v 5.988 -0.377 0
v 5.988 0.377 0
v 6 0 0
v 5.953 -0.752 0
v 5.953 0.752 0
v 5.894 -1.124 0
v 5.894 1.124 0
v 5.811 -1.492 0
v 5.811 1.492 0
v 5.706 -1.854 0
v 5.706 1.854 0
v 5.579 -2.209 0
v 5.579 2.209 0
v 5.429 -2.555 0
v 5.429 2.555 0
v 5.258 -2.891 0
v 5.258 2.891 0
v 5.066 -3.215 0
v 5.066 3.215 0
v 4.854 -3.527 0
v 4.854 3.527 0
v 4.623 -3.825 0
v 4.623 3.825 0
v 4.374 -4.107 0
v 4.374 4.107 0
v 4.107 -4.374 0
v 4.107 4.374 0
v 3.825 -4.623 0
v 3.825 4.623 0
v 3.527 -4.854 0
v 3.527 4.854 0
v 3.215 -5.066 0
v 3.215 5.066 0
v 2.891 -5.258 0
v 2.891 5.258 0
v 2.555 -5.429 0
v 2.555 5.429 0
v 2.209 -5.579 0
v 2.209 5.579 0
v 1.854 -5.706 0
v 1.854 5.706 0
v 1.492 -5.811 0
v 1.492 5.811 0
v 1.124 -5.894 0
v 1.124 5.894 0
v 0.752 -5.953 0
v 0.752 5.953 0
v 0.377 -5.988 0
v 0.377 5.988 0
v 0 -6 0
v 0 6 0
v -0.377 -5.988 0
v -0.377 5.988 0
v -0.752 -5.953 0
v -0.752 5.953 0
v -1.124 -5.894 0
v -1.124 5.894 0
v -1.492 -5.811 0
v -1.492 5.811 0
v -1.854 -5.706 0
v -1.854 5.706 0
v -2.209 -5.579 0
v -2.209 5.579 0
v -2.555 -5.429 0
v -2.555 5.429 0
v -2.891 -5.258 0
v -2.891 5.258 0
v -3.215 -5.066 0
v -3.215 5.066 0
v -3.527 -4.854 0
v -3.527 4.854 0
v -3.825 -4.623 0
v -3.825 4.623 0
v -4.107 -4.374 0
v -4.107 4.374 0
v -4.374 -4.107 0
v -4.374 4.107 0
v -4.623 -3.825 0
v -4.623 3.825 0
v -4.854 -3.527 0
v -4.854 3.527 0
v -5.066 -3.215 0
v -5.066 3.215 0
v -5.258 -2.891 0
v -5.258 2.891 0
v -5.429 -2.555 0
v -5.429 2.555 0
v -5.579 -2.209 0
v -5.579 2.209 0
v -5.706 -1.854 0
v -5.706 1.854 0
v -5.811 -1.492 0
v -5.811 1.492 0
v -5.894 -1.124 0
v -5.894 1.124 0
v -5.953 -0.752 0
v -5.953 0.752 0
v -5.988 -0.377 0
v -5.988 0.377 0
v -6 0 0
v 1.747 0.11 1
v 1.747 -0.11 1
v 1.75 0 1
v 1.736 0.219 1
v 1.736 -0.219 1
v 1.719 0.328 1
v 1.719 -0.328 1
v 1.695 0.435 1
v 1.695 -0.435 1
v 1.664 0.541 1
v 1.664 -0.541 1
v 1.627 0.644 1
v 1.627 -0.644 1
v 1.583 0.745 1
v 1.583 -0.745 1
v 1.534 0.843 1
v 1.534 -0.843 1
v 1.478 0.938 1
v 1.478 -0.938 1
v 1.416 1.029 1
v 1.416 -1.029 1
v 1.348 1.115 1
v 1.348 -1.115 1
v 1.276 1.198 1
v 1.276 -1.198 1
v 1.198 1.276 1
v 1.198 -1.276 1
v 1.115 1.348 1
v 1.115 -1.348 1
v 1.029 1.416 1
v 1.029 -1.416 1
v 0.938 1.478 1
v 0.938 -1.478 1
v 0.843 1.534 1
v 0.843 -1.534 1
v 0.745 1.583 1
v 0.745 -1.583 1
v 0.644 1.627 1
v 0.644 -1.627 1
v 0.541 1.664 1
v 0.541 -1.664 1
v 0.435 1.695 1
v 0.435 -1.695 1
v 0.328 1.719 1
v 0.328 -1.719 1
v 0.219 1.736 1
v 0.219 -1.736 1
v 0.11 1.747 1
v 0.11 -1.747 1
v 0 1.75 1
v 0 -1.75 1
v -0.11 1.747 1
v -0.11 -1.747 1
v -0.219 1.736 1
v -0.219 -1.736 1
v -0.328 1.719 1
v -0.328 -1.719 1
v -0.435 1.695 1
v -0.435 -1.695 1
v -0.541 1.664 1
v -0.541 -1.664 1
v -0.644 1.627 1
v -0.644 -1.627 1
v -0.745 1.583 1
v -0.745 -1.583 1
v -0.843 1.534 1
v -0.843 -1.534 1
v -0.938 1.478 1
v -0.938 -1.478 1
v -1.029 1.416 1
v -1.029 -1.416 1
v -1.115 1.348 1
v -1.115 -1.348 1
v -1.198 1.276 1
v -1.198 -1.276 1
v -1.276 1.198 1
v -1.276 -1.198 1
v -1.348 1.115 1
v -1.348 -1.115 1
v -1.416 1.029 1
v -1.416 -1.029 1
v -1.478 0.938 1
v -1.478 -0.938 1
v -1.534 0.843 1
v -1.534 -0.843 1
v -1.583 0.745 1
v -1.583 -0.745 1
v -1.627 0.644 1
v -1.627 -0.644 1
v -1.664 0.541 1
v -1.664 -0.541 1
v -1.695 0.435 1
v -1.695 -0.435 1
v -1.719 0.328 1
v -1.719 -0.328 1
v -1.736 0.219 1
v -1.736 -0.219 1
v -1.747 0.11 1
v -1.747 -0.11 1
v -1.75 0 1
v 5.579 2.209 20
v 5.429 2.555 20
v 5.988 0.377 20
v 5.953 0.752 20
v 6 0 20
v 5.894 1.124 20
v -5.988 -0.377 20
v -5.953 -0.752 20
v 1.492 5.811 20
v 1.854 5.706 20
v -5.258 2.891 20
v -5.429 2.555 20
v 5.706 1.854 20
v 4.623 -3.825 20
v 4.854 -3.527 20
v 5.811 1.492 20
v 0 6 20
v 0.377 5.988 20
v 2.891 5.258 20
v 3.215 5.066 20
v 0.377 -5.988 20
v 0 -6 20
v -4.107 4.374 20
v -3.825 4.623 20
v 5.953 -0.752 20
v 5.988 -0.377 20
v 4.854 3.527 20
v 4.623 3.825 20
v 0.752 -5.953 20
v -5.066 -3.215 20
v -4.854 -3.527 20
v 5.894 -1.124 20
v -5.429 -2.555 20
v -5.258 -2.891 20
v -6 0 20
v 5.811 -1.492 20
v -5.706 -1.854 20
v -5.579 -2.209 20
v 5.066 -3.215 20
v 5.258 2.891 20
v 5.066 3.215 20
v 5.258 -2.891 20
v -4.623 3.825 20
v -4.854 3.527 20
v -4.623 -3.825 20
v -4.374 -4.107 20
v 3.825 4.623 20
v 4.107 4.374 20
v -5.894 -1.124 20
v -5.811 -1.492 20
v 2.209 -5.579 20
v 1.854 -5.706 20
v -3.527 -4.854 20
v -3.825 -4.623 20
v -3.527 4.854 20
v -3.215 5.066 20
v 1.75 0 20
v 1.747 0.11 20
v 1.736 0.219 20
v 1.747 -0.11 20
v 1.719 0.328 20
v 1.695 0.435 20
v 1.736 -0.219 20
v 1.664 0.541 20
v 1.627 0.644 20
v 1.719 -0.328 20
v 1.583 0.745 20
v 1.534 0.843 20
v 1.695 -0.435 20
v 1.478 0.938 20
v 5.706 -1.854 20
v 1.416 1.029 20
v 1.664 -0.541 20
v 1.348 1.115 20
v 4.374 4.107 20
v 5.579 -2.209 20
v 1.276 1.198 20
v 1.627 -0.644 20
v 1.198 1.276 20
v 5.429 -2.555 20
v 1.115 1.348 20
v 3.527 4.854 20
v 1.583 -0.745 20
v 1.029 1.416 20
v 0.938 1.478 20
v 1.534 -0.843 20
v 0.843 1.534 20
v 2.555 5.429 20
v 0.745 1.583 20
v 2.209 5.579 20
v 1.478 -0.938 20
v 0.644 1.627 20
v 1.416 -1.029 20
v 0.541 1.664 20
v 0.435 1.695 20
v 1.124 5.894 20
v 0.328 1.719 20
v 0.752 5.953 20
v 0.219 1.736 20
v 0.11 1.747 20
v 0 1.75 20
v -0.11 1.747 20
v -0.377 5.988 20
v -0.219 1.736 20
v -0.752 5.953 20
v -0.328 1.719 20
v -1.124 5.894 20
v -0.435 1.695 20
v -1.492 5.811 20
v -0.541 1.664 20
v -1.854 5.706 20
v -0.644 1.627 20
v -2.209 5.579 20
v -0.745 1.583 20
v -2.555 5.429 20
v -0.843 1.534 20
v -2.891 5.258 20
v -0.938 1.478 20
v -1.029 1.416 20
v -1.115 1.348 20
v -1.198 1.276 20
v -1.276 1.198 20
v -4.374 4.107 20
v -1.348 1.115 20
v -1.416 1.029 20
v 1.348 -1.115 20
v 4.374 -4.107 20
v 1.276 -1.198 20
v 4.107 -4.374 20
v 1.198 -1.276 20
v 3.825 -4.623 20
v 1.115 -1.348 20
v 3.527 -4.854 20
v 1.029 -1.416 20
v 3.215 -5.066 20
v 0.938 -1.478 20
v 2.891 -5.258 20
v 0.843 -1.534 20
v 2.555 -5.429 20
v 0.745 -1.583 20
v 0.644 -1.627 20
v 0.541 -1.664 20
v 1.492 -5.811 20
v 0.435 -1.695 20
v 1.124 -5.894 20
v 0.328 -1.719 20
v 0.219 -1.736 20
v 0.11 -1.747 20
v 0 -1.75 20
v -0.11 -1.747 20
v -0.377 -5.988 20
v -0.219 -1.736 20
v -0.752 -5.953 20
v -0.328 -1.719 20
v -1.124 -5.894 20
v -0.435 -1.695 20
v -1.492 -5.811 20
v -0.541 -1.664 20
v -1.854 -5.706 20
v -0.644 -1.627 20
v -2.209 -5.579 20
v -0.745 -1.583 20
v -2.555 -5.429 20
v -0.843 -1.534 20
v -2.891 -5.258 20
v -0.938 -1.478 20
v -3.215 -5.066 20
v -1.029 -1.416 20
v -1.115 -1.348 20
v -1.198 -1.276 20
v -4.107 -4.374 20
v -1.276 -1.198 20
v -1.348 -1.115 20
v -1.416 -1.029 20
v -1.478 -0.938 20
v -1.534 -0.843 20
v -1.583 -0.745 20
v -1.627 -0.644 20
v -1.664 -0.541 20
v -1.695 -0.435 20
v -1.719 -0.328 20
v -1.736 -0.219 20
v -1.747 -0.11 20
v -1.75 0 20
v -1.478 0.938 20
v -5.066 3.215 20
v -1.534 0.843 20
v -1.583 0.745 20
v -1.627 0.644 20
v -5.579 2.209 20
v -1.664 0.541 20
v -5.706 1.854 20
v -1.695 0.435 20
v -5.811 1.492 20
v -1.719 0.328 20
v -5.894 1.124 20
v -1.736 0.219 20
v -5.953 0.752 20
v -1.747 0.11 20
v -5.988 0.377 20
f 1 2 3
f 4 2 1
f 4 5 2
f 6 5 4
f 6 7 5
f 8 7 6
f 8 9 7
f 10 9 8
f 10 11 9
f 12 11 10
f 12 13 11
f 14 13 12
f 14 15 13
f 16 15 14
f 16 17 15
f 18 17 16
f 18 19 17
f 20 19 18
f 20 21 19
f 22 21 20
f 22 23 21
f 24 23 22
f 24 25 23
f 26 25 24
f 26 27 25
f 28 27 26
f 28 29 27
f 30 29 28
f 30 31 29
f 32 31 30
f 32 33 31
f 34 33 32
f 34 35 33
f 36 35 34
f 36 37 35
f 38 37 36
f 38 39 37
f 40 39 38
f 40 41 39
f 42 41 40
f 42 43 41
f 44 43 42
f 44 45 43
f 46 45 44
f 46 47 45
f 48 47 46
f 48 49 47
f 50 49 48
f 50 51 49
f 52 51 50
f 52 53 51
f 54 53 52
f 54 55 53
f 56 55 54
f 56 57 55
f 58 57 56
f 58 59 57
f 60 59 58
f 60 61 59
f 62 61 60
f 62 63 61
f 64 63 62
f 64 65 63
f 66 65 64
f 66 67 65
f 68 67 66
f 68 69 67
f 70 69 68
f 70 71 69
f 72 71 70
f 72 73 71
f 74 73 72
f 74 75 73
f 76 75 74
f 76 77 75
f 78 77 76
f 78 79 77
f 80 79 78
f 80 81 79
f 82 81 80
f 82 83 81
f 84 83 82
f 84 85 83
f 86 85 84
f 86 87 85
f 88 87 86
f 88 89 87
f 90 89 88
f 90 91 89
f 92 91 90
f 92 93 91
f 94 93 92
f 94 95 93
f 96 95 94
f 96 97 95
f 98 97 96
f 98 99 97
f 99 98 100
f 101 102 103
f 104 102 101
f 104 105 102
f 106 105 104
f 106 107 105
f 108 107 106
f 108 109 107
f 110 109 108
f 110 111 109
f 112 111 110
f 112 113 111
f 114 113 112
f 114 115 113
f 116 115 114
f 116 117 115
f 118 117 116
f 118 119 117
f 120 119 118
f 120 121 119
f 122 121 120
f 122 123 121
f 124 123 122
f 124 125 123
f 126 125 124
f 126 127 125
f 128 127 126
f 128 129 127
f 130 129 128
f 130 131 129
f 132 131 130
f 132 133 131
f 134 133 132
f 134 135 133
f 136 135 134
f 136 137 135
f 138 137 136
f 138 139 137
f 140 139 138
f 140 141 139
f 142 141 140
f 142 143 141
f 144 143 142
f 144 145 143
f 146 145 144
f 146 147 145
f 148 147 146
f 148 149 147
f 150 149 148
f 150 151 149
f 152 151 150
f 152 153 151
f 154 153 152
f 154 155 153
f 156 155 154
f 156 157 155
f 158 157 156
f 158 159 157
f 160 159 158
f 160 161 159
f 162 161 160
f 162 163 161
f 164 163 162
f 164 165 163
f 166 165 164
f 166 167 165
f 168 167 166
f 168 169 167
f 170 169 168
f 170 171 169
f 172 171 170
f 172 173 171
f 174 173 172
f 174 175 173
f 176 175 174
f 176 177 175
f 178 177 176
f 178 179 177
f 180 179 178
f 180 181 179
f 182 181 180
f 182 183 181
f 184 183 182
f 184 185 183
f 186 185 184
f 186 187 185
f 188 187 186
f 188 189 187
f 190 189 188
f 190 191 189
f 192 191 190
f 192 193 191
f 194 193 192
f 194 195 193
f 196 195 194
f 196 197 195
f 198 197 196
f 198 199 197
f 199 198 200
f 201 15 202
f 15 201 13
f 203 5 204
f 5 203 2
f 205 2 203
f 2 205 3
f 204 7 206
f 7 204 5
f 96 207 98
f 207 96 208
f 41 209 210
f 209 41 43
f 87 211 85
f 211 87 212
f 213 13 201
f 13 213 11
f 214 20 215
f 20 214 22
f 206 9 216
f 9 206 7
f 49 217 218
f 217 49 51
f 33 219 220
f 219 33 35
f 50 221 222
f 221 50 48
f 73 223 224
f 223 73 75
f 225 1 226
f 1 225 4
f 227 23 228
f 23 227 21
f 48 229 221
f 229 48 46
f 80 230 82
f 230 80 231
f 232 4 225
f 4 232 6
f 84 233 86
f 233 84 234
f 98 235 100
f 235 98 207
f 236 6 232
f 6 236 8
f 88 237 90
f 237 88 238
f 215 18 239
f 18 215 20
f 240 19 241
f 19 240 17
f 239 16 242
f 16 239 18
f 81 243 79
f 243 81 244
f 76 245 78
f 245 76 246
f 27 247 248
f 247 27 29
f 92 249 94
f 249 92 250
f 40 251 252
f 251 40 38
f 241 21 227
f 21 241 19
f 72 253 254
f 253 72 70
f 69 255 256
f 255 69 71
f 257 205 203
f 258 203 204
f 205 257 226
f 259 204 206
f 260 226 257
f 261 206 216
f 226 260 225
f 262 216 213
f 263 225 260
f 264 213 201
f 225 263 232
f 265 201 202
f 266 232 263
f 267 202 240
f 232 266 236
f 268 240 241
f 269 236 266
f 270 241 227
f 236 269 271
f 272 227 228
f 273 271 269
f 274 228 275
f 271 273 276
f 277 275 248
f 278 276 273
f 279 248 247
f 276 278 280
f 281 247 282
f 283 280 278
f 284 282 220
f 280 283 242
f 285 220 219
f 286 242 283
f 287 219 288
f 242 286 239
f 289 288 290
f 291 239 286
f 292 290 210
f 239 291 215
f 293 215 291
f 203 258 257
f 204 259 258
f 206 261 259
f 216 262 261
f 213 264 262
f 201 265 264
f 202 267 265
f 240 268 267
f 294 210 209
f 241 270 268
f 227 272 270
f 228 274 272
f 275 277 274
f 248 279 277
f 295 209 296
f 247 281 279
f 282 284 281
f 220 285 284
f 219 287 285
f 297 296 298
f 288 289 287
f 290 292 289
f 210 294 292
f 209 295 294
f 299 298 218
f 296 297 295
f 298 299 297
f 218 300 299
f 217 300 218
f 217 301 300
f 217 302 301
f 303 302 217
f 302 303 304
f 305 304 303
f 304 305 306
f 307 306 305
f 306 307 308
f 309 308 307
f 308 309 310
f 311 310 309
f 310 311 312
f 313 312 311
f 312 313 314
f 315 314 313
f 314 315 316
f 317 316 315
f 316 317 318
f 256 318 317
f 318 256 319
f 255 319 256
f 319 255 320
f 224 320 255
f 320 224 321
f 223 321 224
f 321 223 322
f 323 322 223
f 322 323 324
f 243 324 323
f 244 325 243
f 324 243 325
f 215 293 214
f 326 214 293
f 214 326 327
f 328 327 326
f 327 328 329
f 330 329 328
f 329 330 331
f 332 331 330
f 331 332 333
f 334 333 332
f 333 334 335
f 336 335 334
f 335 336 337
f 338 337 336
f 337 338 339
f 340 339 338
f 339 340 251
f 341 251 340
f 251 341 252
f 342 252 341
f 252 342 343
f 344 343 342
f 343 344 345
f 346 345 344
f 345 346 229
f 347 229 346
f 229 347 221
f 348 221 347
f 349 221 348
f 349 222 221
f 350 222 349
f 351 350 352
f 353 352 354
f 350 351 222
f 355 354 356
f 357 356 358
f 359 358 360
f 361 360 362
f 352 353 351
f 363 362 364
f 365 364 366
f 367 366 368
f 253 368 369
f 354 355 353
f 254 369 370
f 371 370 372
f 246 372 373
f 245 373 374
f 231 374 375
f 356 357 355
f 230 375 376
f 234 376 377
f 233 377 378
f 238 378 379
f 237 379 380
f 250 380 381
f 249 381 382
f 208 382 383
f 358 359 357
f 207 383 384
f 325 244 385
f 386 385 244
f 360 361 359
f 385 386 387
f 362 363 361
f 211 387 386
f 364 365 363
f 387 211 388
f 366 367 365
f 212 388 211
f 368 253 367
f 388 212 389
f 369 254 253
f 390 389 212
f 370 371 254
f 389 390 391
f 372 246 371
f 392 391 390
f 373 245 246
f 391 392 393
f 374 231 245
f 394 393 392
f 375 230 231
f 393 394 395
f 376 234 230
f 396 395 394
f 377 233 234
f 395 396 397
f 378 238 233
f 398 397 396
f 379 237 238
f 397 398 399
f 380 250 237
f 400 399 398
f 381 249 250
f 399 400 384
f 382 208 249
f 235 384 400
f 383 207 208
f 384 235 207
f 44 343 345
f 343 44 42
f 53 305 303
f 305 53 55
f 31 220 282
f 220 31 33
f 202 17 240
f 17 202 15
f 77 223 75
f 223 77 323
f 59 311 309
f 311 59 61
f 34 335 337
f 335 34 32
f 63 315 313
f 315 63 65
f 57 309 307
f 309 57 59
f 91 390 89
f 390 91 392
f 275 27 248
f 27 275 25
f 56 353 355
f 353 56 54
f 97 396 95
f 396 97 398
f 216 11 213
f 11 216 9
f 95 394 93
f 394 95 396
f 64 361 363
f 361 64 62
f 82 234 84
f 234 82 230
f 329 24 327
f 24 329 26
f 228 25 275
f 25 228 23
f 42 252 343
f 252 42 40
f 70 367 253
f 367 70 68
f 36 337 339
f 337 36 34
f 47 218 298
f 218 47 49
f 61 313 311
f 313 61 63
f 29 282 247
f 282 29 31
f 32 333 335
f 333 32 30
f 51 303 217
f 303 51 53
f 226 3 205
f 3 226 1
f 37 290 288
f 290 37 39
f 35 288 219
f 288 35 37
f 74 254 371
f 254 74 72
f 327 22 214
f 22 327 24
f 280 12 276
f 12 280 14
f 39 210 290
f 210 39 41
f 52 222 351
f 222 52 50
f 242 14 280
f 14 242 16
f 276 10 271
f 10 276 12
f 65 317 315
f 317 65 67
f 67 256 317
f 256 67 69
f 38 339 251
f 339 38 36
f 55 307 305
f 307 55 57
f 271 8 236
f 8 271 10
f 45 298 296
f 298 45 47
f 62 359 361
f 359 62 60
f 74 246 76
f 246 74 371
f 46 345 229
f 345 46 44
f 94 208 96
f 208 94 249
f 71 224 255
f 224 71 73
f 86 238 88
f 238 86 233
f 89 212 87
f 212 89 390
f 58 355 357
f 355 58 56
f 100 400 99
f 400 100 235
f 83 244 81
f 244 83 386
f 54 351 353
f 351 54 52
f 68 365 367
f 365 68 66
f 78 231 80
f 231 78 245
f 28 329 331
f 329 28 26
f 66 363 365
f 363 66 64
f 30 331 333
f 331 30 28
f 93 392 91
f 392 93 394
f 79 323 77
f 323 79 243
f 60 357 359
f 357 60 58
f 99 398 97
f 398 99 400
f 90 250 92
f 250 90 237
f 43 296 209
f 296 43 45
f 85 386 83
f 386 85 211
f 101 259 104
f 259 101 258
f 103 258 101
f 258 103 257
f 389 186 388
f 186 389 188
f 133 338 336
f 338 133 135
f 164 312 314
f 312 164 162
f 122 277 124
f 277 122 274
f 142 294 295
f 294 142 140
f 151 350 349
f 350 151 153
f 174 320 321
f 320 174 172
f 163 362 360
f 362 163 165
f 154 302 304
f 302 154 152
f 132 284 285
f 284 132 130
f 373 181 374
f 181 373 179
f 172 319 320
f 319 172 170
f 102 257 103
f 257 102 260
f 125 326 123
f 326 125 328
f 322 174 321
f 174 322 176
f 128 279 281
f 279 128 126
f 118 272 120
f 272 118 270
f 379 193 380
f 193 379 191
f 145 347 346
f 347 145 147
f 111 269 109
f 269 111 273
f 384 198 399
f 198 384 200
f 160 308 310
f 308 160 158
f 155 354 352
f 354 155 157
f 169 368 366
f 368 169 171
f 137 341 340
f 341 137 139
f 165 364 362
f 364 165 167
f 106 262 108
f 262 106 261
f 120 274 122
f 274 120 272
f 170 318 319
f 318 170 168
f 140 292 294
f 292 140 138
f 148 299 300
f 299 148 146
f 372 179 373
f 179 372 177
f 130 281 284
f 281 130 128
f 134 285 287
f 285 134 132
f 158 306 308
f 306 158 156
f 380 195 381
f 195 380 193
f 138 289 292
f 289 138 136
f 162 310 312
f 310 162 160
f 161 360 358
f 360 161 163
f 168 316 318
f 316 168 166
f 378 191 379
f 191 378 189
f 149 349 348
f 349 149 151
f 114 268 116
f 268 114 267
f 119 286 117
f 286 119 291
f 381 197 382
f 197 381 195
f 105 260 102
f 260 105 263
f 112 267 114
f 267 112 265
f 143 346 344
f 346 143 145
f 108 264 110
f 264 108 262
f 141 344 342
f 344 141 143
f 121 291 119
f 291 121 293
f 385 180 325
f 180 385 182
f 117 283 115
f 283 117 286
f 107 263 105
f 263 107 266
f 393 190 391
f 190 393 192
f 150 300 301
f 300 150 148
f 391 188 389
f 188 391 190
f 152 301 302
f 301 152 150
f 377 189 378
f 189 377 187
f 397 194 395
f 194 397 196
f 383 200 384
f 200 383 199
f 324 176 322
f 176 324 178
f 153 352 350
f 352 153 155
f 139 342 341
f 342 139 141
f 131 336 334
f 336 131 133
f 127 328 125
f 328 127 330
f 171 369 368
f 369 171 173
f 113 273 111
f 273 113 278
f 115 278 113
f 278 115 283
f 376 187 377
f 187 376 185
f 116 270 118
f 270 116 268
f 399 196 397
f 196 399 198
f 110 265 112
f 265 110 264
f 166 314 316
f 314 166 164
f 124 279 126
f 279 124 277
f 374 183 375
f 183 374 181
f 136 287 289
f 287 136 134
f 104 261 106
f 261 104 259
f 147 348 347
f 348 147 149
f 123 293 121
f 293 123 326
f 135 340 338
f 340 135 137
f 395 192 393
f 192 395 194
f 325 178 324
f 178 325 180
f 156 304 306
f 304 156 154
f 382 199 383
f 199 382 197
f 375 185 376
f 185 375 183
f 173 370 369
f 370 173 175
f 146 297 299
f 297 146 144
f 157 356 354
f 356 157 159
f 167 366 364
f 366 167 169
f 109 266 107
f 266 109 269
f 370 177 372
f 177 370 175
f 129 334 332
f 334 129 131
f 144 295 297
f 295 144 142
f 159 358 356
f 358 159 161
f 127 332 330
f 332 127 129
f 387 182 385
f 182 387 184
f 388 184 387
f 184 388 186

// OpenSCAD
include <backbone.scad>
include <reinforcements.scad>

rails_pitch = 64.5;
rail_d = 3.5;
rail_size = 12;
bottom_holder_y = space_ec_w -1;
holder_h = 5;

//ec_holder_bottom();
ec_washer();

module ec_holder_bottom() {
	bottom_holder_w = rails_pitch + rail_size;
	mount_w = bottom_holder_w+25;
	difference() {
		cube(size=[bottom_holder_w, bottom_holder_y, holder_h], center=true);
		cube(size=[bottom_holder_w-2*rail_size, bottom_holder_y-2*rail_size, holder_h*2], center=true);

		// rails
		translate([rails_pitch/-2, 0, 0]) cube(size=[rail_d, bottom_holder_w-2*rf_xsize, holder_h*2], center=true);
		translate([rails_pitch/2, 0, 0]) cube(size=[rail_d, bottom_holder_w-2*rf_xsize, holder_h*2], center=true);

	}
	difference() {
		union() {
			translate([0, bottom_holder_y/2-rf_xsize/2, holder_h/-2]) cube(size=[mount_w, rf_xsize, holder_h*2], center=true);
			translate([0, bottom_holder_y/-2+rf_xsize/2, holder_h/-2]) cube(size=[mount_w, rf_xsize, holder_h*2], center=true);
		}
		// screw holes
		translate([-3*mh_pitch, bottom_holder_y-1, holder_h*-1.5+rf_zsize/2]) rotate(a=[90, 0, 0]) cylinder(d=mh_inner_dia, h=bottom_holder_y*2, $fn=100);
		translate([3*mh_pitch, bottom_holder_y-1, holder_h*-1.5+rf_zsize/2]) rotate(a=[90, 0, 0]) cylinder(d=mh_inner_dia, h=bottom_holder_y*2, $fn=100);
		// nut traps
		translate([-3*mh_pitch, bottom_holder_y/2-rf_xsize/2, holder_h*-1.5+rf_zsize/2]) rotate(a=[90, 0, 0]) nut_trap(h=bottom_holder_y-rf_xsize);
		translate([3*mh_pitch, bottom_holder_y/2-rf_xsize/2, holder_h*-1.5+rf_zsize/2]) rotate(a=[90, 0, 0]) nut_trap(h=bottom_holder_y-rf_xsize);
	}


}

module ec_washer() {
	difference() {
		cylinder(d=rail_size, h=20, $fn=100);
		translate([0, 0, -1]) cylinder(d=rail_d, h=22, $fn=100);
	}
}
